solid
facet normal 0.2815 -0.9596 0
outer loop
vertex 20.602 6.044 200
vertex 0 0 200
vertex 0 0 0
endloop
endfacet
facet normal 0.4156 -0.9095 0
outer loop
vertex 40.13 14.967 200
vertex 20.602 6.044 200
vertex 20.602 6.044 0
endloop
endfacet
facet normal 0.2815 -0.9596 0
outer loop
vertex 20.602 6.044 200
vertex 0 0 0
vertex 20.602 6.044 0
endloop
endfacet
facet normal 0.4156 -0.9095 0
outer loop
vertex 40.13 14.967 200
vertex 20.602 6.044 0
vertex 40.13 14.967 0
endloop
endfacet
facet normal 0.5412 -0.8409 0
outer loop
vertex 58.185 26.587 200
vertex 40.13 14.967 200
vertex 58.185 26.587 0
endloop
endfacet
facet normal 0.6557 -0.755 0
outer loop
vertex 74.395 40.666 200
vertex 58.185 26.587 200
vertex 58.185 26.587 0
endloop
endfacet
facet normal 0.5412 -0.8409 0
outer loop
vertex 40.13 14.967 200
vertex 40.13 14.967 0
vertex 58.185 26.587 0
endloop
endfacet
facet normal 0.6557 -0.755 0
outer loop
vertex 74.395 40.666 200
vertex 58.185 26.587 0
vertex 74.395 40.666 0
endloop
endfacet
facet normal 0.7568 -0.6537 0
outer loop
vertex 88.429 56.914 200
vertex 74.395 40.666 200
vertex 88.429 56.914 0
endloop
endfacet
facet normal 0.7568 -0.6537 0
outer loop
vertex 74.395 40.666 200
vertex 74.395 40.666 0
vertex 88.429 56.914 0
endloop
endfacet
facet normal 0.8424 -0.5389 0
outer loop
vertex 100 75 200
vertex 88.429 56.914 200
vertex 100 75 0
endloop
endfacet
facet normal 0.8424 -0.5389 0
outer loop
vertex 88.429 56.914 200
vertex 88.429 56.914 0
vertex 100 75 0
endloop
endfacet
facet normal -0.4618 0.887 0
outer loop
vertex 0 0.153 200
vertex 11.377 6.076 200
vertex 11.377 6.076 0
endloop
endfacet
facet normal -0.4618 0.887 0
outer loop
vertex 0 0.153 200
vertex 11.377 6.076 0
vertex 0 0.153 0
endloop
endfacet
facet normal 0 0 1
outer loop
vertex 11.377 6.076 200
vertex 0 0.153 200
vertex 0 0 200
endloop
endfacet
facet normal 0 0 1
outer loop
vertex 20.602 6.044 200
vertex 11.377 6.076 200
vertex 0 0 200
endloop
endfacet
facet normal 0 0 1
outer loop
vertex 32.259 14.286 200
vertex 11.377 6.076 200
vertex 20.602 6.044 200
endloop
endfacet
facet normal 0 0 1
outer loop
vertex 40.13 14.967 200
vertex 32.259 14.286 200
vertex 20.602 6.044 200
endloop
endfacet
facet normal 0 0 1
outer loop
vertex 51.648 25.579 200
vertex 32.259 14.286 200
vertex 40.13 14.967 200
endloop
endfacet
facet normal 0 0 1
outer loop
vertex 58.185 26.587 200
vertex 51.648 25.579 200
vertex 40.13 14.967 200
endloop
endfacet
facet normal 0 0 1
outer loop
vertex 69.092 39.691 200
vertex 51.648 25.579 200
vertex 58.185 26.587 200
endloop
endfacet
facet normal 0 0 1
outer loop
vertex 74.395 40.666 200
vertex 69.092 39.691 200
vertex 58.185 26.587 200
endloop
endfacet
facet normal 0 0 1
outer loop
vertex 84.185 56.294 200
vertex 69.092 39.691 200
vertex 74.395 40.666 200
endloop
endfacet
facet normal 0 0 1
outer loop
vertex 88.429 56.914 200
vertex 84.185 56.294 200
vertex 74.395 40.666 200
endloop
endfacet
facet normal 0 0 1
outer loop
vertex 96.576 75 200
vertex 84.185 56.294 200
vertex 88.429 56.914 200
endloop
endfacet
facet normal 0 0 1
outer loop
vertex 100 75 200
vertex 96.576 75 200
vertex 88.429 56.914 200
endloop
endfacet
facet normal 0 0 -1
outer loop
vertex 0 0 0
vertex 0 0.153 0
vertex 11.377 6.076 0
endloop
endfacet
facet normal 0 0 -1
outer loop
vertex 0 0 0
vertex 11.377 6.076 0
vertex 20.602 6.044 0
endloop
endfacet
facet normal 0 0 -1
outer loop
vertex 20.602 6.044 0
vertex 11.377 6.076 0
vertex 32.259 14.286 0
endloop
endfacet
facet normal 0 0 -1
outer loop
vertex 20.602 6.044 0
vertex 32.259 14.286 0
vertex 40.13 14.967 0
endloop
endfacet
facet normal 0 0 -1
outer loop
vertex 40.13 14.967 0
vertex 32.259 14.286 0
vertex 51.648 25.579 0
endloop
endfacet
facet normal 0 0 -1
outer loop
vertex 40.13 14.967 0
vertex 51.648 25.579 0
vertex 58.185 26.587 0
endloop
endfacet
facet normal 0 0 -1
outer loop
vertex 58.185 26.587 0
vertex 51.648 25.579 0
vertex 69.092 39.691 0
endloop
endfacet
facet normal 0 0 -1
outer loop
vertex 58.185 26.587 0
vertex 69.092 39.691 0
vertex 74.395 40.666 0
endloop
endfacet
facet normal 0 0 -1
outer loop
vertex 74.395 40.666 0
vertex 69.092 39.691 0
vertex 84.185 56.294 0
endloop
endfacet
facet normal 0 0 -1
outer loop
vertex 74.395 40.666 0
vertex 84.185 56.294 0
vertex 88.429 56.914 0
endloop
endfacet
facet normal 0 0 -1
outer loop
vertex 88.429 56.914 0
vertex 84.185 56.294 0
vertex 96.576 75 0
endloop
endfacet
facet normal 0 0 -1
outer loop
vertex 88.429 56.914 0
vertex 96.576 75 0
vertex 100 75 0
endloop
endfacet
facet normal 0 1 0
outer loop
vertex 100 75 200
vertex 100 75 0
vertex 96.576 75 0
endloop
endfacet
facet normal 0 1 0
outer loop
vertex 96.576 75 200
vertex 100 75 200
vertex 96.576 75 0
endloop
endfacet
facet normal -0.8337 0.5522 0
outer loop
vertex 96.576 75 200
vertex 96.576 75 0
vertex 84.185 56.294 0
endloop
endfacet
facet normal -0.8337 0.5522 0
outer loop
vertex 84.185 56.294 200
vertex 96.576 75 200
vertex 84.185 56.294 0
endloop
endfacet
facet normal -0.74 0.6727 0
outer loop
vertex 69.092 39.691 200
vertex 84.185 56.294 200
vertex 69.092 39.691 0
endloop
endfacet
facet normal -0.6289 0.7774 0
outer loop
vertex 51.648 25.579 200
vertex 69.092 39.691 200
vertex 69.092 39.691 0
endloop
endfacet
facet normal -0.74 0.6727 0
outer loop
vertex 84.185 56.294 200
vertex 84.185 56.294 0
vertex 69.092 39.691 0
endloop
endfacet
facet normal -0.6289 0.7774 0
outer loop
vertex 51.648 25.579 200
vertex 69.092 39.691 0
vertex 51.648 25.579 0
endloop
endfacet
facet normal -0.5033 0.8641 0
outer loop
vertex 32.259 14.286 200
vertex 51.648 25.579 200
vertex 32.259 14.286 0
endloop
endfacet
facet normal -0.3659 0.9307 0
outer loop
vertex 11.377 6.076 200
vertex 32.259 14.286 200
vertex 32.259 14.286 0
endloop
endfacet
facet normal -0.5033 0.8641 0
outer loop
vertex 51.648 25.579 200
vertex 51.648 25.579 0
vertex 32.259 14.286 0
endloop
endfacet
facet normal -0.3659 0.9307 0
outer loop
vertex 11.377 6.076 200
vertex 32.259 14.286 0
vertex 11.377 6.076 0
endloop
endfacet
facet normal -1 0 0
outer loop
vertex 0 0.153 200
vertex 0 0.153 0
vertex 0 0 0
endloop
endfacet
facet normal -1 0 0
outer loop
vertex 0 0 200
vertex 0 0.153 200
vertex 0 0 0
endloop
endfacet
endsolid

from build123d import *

# Parameters (mm, degrees)
BOSS_EXTRUDE1_DEPTH = 200
CHAMFER1_SIZE       = 2.917865617


with BuildPart() as part:
    # Sketch1 → Boss-Extrude1 (new body)
    with BuildSketch(Plane.XY):
        with BuildLine():
            Line((100, 75), (96.575796241, 75))
            ThreePointArc((96.575796241, 75), (55.991051333, 28.692941942), (0, 3.071323807))
            Line((0, 3.071323807), (0, 0))
            ThreePointArc((0, 0), (58.18465914, 26.587121146), (100, 75))
        make_face()
    extrude(amount=BOSS_EXTRUDE1_DEPTH)

    # Chamfer1
    # the kernel refuses this chamfer: 10, 2.917865617 mm, written as the material it takes off along each edge
    with BuildSketch(Plane(origin=(0, 3.071323807, -30.394078092), x_dir=(0.9668531761663356, 0.25533298991134823, 0), z_dir=(0, 0, 1))) as chamfer1_piece_1:
        with BuildLine():
            Line((11.767108546, 0), (-CHAMFER1_SIZE * 0.255332989918, -CHAMFER1_SIZE * 0.96685317619))
            Line((-CHAMFER1_SIZE * 0.255332989918, -CHAMFER1_SIZE * 0.96685317619), (0, 0))
            ThreePointArc((0, 0), (6.078871228, -0.117659648), (11.767108546, 0))
        make_face()
    extrude(amount=260.788156184, mode=Mode.SUBTRACT)


solid = part.part
